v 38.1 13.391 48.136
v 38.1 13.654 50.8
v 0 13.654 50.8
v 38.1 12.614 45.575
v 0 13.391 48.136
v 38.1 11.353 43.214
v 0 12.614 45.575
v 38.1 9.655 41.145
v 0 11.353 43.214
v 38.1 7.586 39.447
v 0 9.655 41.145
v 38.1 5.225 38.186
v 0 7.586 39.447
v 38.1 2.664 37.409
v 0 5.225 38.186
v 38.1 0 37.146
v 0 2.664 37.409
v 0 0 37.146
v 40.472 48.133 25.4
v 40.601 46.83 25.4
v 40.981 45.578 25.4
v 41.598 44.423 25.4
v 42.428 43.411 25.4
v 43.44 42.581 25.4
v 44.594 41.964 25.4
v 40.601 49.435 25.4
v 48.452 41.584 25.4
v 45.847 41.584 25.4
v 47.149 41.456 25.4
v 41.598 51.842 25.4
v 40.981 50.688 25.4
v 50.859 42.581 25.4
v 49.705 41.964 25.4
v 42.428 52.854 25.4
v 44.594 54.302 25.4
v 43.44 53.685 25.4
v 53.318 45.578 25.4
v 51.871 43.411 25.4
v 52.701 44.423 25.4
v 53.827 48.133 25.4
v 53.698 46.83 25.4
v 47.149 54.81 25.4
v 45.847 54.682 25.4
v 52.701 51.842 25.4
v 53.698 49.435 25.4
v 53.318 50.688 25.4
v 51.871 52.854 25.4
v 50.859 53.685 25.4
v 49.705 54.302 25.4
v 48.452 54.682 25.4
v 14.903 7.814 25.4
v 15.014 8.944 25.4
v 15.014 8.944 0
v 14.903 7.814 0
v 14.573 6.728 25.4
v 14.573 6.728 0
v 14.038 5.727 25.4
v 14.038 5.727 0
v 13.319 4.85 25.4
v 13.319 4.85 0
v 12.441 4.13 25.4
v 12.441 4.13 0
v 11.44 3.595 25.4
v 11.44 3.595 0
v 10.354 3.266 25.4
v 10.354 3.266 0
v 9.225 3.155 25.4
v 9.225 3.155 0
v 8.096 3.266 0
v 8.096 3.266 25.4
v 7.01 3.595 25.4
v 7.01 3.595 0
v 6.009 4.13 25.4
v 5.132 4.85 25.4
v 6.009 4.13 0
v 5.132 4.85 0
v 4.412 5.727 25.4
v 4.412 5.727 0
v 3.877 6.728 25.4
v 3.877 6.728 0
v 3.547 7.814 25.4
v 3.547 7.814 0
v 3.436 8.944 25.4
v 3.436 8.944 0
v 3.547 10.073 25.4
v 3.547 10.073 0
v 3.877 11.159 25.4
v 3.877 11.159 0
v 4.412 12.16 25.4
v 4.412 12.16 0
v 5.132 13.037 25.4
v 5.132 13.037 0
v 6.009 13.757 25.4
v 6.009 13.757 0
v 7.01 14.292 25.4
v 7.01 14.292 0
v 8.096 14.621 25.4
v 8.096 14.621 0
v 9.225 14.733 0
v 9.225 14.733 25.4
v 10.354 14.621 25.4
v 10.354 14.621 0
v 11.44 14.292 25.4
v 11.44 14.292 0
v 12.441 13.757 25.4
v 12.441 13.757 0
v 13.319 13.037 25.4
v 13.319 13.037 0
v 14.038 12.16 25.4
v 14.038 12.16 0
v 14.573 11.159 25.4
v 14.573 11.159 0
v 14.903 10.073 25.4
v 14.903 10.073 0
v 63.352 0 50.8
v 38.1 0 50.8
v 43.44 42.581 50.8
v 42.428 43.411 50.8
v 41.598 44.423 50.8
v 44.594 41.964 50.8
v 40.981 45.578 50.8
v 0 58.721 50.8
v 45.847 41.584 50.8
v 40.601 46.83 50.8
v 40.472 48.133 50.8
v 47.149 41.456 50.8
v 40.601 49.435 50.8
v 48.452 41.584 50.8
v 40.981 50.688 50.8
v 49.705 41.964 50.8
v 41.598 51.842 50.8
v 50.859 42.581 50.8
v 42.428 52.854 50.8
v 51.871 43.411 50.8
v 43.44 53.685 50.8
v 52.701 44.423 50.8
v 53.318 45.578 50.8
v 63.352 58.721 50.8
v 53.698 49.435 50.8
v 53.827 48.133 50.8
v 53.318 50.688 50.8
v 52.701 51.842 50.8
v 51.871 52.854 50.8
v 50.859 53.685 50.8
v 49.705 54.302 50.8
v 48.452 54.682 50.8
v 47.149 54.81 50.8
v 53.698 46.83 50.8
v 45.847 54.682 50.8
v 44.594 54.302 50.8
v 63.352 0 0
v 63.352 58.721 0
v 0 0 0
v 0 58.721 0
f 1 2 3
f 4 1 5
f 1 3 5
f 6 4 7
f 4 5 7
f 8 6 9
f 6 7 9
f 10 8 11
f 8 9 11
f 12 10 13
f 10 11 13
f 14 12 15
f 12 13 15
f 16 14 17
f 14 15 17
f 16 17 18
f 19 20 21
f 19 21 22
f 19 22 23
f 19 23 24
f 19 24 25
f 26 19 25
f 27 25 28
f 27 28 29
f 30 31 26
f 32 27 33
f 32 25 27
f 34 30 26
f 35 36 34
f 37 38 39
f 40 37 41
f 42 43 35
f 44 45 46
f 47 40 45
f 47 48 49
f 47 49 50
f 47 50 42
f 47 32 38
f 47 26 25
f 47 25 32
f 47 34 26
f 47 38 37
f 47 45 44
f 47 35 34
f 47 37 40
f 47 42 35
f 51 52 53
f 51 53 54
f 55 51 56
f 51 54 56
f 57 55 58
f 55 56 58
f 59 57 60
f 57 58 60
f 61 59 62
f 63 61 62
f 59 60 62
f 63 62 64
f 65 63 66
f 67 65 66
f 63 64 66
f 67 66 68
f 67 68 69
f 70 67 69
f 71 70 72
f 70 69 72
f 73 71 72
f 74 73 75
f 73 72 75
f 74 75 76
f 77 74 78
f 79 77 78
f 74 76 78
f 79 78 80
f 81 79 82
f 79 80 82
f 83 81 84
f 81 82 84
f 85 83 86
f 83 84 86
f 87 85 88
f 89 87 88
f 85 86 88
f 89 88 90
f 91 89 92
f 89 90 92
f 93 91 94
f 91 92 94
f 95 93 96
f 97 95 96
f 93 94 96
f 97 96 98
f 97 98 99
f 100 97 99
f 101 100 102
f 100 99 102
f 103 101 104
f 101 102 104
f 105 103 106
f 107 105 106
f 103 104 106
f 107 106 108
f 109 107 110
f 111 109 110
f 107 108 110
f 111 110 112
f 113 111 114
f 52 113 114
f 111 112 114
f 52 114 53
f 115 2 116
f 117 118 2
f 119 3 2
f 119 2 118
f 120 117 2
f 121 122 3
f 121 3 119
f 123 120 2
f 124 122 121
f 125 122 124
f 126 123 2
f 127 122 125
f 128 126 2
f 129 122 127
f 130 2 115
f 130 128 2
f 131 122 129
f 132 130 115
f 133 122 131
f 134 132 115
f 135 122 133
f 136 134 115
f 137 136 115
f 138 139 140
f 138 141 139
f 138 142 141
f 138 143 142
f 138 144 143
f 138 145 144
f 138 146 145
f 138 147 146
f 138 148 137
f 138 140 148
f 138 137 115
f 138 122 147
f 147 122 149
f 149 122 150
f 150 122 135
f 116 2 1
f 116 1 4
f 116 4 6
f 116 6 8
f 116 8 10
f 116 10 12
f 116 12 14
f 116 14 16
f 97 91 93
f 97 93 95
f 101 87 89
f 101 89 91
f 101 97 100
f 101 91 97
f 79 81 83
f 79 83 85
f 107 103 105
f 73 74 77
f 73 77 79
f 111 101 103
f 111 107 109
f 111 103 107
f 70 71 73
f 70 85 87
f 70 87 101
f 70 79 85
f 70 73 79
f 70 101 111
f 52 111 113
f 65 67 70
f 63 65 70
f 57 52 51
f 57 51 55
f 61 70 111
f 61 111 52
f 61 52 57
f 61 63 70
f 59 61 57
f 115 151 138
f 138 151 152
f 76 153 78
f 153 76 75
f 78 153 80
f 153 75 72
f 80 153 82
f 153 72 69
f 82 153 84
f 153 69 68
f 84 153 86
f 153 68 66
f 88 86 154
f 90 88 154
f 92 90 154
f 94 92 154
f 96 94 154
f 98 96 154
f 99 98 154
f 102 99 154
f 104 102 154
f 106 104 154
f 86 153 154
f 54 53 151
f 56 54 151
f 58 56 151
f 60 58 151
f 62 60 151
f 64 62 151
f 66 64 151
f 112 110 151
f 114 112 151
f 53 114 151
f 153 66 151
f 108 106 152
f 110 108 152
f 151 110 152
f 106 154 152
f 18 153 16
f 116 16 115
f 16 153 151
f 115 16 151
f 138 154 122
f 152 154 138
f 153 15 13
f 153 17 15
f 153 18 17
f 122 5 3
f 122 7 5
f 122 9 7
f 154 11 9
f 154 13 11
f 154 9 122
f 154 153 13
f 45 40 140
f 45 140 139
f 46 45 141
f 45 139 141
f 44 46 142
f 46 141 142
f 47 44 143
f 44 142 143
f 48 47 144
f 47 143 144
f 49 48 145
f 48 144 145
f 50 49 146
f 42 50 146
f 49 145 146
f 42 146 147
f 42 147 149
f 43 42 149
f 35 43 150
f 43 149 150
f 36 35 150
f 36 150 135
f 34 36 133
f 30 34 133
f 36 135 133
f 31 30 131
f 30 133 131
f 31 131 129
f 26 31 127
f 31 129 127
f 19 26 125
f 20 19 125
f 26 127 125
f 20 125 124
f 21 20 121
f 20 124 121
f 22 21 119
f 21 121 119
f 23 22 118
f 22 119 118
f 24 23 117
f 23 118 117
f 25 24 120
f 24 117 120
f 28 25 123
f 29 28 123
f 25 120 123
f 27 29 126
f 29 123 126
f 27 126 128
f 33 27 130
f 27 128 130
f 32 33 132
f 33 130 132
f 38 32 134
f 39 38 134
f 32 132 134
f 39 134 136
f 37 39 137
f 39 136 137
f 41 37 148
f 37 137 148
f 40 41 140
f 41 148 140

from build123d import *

# Parameters (mm, degrees)
F0_W     = 63.351966
F0_H     = 58.721166
F1_DEPTH = 50.8
F2_R     = 6.67715
F3_DEPTH = 25.4
F4_R     = 5.78901
F5_DEPTH = 25.4
F6_R     = 13.653807
F7_DEPTH = 38.1


with BuildPart() as f1:
    # F0 (on Top) → F1 (new body)
    with BuildSketch(Plane.XY):
        with Locations((31.675983, 29.360583)):
            Rectangle(F0_W, F0_H)
    extrude(amount=F1_DEPTH)

    # F2 (on face) → F3 (cut)
    with BuildSketch(Plane.XY.offset(50.8)):
        with Locations((47.149416, 48.132766)):
            Circle(F2_R)
    extrude(amount=-F3_DEPTH, mode=Mode.SUBTRACT)

    # F4 (on face) → F5 (cut)
    with BuildSketch(Plane(origin=(0, 0, 0), x_dir=(1, 0, 0), z_dir=(0, 0, -1))):
        with Locations((9.225111, -8.943532)):
            Circle(F4_R)
    extrude(amount=-F5_DEPTH, mode=Mode.SUBTRACT)

    # F6 (on face) → F7 (cut)
    with BuildSketch(Plane(origin=(0, 0, 0), x_dir=(0, -1, 0), z_dir=(-1, 0, 0))):
        with Locations((0, 50.8)):
            Circle(F6_R)
    extrude(amount=-F7_DEPTH, mode=Mode.SUBTRACT)


solid = f1.part
